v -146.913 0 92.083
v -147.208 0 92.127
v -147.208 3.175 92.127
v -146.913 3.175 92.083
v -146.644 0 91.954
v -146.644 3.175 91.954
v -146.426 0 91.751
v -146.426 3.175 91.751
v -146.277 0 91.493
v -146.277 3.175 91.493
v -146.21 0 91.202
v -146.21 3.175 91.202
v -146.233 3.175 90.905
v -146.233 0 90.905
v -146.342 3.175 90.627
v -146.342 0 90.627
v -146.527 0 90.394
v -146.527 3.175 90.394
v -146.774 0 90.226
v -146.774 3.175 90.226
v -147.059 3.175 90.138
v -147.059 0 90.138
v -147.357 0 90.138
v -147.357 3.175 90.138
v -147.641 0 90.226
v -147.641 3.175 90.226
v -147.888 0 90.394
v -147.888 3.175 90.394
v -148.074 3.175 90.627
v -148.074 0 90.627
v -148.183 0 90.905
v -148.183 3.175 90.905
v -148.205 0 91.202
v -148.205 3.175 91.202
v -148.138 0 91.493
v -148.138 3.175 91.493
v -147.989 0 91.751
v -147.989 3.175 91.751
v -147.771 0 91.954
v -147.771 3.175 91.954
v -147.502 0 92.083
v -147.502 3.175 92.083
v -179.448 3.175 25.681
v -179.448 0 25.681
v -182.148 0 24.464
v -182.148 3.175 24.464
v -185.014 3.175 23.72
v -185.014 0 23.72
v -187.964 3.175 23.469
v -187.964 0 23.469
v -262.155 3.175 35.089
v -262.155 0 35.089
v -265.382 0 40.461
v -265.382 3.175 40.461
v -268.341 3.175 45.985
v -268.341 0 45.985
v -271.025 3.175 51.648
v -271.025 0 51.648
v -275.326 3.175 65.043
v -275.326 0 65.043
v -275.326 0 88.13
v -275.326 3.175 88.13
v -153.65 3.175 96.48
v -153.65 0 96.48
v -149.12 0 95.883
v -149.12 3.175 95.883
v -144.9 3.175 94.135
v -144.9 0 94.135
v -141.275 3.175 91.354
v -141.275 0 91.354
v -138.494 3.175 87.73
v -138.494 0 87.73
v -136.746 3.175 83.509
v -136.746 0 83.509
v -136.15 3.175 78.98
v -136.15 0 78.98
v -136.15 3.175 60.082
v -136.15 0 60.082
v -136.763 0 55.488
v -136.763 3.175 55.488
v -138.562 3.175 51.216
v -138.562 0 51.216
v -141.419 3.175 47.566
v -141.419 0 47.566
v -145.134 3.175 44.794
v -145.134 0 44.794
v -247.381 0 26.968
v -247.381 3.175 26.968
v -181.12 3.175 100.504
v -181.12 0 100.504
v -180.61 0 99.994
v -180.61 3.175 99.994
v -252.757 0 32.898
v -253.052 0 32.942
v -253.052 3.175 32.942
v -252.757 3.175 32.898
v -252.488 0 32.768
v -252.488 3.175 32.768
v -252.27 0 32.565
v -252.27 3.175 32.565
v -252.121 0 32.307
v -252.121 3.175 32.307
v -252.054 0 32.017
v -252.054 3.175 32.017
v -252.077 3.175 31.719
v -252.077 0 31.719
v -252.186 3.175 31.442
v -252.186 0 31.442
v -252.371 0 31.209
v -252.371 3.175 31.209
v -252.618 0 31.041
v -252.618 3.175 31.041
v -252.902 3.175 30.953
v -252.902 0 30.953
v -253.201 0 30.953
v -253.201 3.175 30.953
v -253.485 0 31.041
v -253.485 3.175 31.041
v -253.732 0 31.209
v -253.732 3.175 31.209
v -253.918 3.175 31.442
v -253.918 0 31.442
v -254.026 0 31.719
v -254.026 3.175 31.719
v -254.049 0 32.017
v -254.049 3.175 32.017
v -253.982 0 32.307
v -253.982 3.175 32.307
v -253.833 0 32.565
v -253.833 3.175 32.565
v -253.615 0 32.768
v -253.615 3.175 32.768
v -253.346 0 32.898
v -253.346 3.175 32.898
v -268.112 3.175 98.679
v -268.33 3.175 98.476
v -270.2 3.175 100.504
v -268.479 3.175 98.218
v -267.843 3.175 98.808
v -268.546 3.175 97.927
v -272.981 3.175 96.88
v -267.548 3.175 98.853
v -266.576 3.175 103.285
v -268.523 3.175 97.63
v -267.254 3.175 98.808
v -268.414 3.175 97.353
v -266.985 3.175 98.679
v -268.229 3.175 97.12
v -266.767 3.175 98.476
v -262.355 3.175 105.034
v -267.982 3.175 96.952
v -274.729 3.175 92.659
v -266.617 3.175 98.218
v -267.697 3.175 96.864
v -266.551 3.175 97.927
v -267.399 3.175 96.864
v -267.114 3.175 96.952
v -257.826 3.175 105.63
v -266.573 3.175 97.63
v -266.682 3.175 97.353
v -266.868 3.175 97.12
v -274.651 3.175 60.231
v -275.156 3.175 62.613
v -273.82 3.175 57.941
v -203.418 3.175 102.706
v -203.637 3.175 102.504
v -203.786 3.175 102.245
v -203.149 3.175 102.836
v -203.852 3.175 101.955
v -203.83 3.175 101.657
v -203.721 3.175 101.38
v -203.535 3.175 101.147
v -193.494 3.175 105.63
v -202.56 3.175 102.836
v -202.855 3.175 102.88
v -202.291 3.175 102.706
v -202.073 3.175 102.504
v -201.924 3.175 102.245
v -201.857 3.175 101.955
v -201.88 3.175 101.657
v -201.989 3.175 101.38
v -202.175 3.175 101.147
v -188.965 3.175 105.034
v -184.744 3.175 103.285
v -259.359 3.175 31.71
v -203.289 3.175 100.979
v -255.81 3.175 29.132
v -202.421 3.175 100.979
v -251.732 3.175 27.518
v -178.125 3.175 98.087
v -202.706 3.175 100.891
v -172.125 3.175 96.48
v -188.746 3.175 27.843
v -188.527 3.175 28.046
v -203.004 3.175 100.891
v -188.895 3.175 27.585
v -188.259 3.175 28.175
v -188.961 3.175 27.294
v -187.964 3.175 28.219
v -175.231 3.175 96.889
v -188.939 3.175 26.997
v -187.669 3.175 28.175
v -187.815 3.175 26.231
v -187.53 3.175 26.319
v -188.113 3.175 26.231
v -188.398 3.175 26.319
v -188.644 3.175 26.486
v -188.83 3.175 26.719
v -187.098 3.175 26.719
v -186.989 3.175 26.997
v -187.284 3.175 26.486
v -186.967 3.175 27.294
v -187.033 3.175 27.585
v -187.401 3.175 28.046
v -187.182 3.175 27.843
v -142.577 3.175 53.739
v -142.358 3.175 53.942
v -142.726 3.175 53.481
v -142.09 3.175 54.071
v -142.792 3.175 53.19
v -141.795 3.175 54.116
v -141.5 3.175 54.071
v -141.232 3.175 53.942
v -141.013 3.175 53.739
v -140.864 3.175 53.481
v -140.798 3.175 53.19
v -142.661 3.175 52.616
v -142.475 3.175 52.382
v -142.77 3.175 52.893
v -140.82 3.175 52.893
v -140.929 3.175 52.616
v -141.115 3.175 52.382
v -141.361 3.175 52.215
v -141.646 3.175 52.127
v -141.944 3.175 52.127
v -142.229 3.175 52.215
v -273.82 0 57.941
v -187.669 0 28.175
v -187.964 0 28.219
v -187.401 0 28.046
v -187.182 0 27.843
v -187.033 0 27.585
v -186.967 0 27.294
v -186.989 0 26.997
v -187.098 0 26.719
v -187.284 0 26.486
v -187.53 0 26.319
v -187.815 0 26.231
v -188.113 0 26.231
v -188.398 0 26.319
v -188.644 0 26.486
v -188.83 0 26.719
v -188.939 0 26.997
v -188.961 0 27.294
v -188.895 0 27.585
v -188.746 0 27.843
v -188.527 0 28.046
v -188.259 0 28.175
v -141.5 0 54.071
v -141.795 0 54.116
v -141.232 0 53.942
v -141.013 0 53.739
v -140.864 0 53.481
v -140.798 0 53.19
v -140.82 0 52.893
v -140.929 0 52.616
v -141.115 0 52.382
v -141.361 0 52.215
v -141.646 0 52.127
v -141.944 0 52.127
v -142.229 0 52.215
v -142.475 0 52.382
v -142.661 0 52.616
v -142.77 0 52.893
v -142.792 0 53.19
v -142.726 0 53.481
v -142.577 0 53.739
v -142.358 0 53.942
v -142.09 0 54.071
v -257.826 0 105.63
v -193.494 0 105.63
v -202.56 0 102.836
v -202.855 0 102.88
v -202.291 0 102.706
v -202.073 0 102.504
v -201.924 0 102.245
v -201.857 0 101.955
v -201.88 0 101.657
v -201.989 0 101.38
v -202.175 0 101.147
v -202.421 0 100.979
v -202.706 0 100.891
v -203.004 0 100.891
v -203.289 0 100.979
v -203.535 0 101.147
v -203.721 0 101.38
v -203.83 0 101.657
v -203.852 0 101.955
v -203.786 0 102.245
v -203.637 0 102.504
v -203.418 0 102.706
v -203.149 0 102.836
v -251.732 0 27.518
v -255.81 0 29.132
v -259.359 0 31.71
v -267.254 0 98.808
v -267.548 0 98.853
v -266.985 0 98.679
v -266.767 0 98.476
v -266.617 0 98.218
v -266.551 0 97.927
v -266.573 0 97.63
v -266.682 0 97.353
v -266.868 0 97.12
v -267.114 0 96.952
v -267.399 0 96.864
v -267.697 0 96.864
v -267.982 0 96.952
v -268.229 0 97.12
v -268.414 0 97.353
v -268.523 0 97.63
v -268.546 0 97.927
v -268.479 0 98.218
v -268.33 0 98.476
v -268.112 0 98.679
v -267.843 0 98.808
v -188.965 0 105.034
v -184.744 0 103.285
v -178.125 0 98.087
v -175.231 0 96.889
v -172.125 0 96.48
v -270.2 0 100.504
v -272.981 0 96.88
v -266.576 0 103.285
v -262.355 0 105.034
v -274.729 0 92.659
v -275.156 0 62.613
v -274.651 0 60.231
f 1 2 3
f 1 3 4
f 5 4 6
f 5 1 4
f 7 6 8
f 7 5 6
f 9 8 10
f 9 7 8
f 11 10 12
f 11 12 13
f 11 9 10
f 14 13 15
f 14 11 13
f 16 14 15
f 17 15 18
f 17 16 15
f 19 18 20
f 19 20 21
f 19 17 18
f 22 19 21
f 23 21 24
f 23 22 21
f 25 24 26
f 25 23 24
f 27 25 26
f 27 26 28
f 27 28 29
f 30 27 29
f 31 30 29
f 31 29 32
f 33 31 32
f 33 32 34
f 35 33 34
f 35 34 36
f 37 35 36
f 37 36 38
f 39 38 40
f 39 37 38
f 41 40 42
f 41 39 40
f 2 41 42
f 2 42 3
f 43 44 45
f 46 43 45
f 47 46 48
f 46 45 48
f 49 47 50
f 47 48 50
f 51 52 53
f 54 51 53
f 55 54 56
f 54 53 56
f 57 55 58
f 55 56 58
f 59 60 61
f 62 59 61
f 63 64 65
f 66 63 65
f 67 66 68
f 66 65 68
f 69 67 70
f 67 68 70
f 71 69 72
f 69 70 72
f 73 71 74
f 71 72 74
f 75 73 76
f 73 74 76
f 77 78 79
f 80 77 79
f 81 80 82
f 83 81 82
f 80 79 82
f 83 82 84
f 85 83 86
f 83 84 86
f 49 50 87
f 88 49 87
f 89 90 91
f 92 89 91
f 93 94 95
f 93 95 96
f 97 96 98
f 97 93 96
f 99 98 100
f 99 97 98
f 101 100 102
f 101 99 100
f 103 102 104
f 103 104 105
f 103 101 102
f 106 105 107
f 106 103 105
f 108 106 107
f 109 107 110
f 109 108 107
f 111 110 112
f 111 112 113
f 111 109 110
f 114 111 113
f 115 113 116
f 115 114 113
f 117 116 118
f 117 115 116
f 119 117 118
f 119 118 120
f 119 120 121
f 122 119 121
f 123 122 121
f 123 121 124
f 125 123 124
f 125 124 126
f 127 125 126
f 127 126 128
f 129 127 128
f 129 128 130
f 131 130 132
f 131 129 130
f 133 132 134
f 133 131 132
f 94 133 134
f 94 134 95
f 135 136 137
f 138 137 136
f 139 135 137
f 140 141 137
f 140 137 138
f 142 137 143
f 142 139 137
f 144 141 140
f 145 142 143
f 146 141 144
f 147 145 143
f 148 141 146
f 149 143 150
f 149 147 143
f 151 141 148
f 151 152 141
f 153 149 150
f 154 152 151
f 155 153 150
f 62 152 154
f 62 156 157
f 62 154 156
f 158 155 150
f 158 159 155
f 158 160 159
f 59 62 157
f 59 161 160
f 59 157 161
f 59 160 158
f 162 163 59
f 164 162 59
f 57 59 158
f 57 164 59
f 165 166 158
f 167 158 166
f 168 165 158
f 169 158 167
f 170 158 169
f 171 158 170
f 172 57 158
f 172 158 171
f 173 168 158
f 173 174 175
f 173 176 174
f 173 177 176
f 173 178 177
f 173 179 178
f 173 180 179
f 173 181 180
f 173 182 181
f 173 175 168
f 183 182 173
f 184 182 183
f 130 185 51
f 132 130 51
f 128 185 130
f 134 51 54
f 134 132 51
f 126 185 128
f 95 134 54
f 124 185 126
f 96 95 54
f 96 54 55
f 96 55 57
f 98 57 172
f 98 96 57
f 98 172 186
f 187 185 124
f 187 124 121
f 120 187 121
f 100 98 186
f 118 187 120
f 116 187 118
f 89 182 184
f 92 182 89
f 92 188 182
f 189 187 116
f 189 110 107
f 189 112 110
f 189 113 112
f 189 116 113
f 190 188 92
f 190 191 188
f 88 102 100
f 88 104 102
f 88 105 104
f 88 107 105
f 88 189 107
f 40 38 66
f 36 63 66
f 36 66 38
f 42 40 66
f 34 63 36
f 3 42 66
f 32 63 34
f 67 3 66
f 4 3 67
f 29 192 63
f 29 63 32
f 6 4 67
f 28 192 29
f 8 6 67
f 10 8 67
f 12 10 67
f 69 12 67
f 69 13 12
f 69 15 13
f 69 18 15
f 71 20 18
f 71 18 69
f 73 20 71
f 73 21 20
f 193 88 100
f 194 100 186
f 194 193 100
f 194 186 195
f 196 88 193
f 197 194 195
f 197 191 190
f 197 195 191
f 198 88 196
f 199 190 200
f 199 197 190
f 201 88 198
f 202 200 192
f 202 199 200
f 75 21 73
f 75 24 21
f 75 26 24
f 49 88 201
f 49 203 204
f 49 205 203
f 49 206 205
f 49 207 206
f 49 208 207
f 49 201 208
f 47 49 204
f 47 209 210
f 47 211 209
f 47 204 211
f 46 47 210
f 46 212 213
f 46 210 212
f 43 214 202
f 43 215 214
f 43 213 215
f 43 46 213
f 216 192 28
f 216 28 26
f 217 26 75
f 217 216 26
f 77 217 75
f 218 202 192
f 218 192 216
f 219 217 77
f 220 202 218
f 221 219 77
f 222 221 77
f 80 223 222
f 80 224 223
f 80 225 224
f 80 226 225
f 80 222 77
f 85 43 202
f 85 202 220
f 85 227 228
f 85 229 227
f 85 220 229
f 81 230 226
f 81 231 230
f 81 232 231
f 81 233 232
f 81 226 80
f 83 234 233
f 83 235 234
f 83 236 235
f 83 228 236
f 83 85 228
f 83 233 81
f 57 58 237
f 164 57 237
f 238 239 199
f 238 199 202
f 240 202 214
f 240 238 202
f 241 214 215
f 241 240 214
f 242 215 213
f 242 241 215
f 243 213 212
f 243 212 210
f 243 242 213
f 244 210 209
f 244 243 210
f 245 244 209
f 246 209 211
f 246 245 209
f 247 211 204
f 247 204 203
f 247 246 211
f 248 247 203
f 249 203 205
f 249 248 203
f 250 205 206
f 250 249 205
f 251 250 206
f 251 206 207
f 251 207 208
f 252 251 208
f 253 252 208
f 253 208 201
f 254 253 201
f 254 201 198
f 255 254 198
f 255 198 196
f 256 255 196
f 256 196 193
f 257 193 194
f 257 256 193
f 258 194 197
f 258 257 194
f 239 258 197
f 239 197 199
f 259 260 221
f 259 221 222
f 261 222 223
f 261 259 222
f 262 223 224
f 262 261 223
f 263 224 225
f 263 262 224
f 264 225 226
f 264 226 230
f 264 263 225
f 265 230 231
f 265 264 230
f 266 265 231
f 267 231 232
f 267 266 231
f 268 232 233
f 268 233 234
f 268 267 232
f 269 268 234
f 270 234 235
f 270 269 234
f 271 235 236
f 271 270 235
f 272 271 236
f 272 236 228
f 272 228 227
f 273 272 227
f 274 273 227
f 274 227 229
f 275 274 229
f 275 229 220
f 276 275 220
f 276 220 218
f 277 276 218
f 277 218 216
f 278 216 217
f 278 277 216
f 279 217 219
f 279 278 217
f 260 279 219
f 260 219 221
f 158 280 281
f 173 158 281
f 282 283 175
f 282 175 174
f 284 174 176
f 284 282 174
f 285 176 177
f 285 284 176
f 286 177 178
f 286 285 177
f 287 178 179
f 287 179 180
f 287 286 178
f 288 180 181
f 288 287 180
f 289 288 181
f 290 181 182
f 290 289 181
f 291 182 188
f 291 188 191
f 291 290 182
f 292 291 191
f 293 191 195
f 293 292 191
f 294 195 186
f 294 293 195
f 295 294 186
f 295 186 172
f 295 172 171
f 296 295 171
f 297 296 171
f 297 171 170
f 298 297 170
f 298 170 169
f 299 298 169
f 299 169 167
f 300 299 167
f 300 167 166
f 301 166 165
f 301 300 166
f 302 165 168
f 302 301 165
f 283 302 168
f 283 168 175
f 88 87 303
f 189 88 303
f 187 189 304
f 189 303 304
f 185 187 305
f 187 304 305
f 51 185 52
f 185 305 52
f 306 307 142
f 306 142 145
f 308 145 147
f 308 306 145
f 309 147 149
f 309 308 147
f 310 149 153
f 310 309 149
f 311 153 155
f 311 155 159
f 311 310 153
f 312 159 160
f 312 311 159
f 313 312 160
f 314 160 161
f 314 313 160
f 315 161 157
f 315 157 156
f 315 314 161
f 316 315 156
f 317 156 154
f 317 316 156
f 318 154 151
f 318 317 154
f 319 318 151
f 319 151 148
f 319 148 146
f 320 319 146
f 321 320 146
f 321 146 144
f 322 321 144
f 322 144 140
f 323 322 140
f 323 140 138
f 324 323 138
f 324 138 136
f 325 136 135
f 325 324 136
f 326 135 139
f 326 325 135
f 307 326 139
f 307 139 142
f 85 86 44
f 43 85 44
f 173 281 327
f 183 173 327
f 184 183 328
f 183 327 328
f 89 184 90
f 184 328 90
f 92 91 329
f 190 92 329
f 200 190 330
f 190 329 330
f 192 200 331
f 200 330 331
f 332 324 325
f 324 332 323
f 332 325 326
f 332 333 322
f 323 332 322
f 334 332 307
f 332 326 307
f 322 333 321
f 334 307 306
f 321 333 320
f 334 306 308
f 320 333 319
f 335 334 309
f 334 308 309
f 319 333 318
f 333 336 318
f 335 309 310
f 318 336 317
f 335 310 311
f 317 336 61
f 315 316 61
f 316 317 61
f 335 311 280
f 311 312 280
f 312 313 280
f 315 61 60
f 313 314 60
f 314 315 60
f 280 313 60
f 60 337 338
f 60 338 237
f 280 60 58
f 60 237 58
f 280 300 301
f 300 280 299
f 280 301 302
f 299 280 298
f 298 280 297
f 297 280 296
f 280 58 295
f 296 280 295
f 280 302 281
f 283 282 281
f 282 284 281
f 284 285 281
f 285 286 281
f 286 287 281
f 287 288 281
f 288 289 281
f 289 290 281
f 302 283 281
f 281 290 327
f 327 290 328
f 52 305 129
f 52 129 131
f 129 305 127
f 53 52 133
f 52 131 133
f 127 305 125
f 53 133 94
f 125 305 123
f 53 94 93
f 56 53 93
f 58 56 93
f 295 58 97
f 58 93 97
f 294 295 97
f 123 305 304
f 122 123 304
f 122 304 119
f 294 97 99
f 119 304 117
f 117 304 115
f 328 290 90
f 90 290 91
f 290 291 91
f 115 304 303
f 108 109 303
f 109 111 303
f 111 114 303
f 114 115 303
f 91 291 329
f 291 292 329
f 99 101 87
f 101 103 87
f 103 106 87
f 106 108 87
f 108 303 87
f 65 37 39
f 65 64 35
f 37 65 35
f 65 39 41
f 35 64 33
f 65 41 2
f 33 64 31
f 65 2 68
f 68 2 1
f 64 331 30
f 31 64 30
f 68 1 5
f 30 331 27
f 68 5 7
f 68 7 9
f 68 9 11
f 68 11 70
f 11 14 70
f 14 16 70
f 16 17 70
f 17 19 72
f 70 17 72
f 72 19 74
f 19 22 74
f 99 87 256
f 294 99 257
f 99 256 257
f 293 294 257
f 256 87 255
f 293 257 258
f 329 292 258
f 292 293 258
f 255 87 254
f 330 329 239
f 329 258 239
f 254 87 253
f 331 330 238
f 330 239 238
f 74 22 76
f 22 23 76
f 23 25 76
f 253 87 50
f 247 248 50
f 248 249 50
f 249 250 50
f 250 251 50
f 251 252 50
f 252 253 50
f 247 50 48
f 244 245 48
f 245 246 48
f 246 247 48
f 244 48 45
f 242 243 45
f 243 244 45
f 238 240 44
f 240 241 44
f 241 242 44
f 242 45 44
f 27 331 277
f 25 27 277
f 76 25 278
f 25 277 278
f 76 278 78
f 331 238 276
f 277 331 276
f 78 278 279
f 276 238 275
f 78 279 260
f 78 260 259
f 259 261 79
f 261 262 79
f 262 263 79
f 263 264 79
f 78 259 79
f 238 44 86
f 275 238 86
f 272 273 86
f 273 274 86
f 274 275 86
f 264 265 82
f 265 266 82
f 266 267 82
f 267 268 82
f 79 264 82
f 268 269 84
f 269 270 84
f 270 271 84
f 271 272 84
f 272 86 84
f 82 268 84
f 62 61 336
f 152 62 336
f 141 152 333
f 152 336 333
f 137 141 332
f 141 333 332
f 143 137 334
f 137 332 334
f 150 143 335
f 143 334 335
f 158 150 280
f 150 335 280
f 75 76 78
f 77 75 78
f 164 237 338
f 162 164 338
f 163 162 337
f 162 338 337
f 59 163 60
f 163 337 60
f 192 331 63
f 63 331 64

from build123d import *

# Parameters (mm, degrees)
SKETCH2_R           = 1
BOSS_EXTRUDE1_DEPTH = 3.175


with BuildPart() as part:
    # Sketch2 → Boss-Extrude1 (new body)
    with BuildSketch(Plane(origin=(0, 0, 0), x_dir=(1, 0, 0), z_dir=(0, 1, 0))):
        with BuildLine():
            Line((-257.8256366, -105.630010281), (-193.494425739, -105.630010281))
            ThreePointArc((-193.494425739, -105.630010281), (-186.797465673, -104.2979021), (-181.120057068, -100.504378951))
            Line((-181.120057068, -100.504378951), (-180.610104454, -99.994426337))
            ThreePointArc((-180.610104454, -99.994426337), (-176.717024269, -97.393153322), (-172.12482308, -96.479707712))
            Line((-172.12482308, -96.479707712), (-153.649556898, -96.479707712))
            ThreePointArc((-153.649556898, -96.479707712), (-141.275188227, -91.354076382), (-136.149556898, -78.979707712))
            Line((-136.149556898, -78.979707712), (-136.149556898, -60.08207123))
            ThreePointArc((-136.149556898, -60.08207123), (-138.561974219, -51.215569726), (-145.13411106, -44.793605572))
            Line((-145.13411106, -44.793605572), (-179.448460407, -25.681028163))
            ThreePointArc((-179.448460407, -25.681028163), (-183.56493756, -24.031398459), (-187.963906245, -23.469493821))
            Line((-187.963906245, -23.469493821), (-247.380541868, -26.968041449))
            ThreePointArc((-247.380541868, -26.968041449), (-255.809979804, -29.131986673), (-262.154750087, -35.088661324))
            ThreePointArc((-262.154750087, -35.088661324), (-266.895911353, -43.204457303), (-271.025140144, -51.648048015))
            Line((-271.025140144, -51.648048015), (-273.819629856, -57.941117122))
            ThreePointArc((-273.819629856, -57.941117122), (-274.944995262, -61.413292167), (-275.3256366, -65.043382939))
            Line((-275.3256366, -65.043382939), (-275.3256366, -88.130010281))
            ThreePointArc((-275.3256366, -88.130010281), (-270.200005271, -100.504378951), (-257.8256366, -105.630010281))
        make_face()
        with Locations(Location((-147.207602145, -91.127288498, 0), (0, 0, 270))):
            Circle(SKETCH2_R, mode=Mode.SUBTRACT)
        with Locations(Location((-141.795027651, -53.115534334, 0), (0, 0, 270))):
            Circle(SKETCH2_R, mode=Mode.SUBTRACT)
        with Locations(Location((-187.963906245, -27.219493821, 0), (0, 0, 270))):
            Circle(SKETCH2_R, mode=Mode.SUBTRACT)
        with Locations(Location((-253.051529835, -31.941972813, 0), (0, 0, 270))):
            Circle(SKETCH2_R, mode=Mode.SUBTRACT)
        with Locations(Location((-267.548354841, -97.852728522, 0), (0, 0, 270))):
            Circle(SKETCH2_R, mode=Mode.SUBTRACT)
        with Locations(Location((-202.85468144, -101.880010281, 0), (0, 0, 270))):
            Circle(SKETCH2_R, mode=Mode.SUBTRACT)
    extrude(amount=BOSS_EXTRUDE1_DEPTH)


solid = part.part
